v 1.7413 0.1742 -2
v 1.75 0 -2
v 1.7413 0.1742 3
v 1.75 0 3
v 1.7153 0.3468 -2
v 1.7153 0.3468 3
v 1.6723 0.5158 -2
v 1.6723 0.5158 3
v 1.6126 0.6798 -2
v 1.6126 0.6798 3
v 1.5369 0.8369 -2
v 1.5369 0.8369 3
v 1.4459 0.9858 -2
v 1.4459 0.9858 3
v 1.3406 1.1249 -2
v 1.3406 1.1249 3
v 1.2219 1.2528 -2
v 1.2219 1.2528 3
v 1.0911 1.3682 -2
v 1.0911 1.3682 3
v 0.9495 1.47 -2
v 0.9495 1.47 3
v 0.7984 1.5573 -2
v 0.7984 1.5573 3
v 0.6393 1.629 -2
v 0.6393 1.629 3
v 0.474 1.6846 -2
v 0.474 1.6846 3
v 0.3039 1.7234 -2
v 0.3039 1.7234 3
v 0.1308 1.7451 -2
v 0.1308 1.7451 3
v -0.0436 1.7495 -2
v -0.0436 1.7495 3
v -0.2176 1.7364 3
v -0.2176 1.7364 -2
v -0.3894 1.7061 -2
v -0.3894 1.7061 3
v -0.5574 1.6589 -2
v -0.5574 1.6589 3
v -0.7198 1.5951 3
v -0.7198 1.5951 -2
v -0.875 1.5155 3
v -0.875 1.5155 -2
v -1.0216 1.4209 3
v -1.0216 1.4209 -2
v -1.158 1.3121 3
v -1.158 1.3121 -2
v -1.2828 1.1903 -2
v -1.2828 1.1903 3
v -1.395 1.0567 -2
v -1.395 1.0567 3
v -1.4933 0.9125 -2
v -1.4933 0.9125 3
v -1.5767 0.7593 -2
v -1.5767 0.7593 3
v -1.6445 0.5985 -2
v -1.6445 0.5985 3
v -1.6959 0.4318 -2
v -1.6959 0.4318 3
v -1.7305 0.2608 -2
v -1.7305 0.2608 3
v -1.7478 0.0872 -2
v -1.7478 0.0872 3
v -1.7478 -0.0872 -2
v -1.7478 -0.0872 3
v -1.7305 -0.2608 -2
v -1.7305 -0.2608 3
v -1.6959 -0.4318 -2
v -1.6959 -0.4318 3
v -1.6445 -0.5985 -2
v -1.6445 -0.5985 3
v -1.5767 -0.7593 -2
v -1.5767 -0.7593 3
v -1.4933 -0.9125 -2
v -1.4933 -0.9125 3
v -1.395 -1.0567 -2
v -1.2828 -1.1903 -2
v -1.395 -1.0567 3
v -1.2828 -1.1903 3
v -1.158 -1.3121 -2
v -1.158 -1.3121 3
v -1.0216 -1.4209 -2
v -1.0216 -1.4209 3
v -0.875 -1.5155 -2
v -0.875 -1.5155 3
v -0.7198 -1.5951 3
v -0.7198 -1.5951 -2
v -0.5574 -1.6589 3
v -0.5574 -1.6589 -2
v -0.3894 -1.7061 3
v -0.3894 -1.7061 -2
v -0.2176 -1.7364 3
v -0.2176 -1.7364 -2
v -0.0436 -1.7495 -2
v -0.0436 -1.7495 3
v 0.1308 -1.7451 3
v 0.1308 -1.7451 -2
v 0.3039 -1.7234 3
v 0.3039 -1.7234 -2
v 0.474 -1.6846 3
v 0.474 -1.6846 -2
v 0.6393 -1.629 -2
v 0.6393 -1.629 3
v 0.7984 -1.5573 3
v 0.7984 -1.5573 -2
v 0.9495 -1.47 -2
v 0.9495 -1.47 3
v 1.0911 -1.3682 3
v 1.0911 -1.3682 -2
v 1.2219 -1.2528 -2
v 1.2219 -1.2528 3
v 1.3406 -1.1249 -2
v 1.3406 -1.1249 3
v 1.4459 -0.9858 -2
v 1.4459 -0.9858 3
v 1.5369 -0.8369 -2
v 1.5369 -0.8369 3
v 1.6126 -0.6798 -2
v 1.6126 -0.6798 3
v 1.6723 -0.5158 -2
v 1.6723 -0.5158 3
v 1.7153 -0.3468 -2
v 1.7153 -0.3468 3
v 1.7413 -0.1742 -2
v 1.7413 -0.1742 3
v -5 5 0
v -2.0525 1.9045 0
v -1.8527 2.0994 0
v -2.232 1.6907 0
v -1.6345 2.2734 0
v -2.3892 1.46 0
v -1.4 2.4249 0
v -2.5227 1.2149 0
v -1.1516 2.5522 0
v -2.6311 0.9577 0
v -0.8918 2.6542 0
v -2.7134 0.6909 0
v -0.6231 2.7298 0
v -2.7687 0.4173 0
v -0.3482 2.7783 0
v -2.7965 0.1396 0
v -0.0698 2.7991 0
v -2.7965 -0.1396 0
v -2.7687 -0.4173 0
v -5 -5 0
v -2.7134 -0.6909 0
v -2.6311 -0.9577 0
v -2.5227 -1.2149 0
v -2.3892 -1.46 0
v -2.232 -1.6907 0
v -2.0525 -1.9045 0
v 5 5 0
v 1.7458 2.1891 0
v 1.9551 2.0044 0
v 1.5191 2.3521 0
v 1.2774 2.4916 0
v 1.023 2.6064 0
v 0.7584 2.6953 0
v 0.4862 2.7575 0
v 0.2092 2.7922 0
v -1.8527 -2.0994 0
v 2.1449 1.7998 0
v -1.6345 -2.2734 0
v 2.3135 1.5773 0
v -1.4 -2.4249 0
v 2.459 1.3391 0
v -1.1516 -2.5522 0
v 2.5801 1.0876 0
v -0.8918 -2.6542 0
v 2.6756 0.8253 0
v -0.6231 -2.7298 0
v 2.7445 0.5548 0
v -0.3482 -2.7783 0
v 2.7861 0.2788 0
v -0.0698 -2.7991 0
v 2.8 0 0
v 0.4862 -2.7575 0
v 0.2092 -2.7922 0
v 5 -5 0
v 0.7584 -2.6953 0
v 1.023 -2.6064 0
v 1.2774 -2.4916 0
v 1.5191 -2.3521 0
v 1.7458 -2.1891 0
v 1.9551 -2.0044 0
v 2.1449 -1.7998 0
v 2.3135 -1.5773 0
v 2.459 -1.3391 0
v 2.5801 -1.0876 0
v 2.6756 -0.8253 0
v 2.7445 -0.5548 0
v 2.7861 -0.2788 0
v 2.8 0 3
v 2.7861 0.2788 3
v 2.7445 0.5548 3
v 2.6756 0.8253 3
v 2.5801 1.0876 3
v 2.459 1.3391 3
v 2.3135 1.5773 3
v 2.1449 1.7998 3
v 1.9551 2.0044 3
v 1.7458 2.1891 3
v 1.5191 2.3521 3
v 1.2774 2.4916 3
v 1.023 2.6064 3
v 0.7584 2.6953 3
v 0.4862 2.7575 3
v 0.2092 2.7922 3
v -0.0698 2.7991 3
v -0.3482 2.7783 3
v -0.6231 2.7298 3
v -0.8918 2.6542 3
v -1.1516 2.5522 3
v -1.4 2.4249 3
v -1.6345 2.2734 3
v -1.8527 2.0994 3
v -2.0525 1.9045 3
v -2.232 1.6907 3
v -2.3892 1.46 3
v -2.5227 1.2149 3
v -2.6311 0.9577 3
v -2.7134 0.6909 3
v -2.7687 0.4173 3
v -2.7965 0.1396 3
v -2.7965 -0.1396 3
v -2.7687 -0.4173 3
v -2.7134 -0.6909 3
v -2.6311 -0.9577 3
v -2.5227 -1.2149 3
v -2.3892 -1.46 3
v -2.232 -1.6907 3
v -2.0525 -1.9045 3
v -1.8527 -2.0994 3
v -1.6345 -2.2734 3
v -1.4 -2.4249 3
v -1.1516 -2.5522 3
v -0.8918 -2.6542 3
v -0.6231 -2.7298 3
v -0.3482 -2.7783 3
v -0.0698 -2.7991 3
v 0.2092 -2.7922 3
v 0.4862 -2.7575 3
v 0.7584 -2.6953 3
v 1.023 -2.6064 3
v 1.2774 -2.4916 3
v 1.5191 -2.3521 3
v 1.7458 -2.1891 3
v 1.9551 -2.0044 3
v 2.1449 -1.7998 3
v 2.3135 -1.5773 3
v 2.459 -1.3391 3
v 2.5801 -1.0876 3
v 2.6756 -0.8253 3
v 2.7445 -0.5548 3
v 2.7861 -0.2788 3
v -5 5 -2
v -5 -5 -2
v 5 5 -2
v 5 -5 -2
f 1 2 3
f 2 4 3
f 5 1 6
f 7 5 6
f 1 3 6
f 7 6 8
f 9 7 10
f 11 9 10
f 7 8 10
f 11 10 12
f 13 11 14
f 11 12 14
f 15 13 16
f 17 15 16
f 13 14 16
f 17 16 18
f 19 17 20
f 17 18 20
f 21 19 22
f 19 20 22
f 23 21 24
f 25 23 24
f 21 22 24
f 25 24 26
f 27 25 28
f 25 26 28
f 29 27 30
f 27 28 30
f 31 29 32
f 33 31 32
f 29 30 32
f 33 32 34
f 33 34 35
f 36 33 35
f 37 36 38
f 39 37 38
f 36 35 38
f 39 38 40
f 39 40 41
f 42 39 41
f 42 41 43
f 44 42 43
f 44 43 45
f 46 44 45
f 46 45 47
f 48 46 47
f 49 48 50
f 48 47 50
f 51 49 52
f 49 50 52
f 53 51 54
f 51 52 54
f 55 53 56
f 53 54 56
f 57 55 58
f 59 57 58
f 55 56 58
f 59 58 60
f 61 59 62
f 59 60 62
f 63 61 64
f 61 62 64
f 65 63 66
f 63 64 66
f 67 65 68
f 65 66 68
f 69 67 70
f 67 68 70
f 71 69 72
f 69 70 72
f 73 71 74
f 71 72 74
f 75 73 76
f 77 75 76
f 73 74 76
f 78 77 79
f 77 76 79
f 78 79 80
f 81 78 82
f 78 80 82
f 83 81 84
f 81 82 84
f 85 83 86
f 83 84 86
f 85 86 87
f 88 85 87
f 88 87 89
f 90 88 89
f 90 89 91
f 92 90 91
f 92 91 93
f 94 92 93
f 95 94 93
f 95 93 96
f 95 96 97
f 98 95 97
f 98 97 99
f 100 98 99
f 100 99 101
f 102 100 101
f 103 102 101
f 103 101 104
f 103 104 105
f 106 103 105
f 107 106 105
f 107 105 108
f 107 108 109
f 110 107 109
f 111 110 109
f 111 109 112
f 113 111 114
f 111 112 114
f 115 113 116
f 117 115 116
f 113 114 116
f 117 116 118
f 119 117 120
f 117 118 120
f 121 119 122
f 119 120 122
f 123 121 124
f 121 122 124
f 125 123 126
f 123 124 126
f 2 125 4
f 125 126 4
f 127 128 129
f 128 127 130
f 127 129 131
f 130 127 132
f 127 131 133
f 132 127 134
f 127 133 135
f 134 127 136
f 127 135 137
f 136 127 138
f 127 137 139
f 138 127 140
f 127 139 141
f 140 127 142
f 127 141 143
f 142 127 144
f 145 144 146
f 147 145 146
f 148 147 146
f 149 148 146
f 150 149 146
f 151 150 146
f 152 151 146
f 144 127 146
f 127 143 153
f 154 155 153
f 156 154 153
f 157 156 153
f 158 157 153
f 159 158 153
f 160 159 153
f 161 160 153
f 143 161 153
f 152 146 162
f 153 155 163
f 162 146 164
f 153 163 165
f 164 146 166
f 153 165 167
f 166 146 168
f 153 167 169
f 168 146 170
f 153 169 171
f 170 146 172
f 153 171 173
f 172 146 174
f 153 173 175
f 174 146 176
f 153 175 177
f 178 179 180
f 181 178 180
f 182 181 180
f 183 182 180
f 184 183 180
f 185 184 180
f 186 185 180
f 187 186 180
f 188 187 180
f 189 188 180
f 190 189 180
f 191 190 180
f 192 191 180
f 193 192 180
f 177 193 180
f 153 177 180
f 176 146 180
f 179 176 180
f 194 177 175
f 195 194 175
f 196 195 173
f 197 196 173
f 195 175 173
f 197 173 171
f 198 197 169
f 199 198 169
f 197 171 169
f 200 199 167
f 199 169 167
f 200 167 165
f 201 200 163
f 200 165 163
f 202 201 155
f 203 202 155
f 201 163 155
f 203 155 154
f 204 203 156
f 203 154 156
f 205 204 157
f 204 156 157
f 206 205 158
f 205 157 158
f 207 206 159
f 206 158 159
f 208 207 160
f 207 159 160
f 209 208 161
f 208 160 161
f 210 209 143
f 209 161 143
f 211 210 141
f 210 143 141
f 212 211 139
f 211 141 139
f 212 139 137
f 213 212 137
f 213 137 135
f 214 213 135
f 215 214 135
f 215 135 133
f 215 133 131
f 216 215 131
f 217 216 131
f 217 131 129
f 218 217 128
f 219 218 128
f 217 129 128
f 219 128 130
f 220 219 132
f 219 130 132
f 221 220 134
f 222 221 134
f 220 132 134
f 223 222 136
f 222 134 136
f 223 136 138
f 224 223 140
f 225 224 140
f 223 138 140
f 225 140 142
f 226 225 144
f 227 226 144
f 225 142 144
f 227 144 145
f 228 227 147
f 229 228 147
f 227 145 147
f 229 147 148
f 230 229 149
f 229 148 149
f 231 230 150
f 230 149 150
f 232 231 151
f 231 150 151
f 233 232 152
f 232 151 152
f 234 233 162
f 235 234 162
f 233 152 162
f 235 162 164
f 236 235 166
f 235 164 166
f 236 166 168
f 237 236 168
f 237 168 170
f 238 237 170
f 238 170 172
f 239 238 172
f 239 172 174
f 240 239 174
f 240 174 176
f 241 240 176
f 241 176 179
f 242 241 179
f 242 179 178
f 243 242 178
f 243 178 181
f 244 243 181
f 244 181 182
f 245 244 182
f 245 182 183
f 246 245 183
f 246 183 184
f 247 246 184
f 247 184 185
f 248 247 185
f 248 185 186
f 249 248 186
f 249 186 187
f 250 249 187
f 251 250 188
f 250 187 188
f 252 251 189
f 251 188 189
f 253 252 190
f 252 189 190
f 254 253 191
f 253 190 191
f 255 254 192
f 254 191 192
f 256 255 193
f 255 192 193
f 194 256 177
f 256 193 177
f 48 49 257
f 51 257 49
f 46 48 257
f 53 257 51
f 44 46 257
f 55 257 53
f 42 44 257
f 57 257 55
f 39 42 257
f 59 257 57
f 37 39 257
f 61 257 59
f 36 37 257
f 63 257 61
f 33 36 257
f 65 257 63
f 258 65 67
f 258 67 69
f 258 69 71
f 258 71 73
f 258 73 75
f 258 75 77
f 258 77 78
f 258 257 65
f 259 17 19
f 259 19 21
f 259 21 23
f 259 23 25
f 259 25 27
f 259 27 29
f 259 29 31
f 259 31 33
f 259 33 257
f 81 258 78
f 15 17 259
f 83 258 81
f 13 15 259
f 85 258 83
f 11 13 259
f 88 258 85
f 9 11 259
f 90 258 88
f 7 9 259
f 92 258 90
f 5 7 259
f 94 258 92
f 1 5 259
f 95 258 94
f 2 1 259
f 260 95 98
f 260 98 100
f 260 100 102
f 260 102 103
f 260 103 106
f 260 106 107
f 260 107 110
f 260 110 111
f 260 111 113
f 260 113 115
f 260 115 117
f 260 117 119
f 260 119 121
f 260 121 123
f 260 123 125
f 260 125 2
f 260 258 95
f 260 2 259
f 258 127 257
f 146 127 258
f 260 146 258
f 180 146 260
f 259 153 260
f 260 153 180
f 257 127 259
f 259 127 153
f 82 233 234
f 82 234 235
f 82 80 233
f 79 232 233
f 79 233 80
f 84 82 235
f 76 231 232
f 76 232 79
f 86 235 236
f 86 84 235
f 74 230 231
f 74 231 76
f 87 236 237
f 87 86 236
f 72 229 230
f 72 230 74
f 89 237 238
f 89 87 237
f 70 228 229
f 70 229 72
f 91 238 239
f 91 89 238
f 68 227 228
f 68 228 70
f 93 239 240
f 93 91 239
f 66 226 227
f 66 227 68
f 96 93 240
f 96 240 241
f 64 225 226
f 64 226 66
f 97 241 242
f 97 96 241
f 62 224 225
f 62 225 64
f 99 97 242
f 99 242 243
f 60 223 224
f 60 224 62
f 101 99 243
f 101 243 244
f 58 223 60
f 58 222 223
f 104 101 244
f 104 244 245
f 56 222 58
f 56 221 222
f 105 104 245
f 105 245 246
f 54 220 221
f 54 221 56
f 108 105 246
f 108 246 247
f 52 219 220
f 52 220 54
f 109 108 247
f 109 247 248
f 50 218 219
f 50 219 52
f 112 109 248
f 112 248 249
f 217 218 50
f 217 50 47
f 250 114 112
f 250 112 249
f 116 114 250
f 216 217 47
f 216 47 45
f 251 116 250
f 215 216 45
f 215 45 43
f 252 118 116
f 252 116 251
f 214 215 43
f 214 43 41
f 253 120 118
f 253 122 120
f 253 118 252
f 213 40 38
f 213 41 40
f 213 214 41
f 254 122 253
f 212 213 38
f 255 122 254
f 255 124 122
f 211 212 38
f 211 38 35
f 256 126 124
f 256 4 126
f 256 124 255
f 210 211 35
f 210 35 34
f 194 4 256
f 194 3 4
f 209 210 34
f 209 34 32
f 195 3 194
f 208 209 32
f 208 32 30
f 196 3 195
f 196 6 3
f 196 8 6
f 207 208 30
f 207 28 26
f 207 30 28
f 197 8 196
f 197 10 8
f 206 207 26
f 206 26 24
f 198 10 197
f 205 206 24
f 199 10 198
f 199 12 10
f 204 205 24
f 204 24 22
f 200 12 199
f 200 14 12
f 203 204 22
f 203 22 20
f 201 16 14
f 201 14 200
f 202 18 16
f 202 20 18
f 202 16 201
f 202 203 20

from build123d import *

# Parameters (mm, degrees)
SKETCH_R        = 2.8
PAD_DEPTH       = 3
SKETCH001_R     = 1.75
POCKET_DEPTH    = 4
SKETCH002_W     = 10
SKETCH002_H     = 10
PAD001_DEPTH    = 2
SKETCH003_R     = 1.75
POCKET001_DEPTH = 5


with BuildPart() as part:
    # Sketch → Pad (new body)
    with BuildSketch(Plane.XY):
        Circle(SKETCH_R)
    extrude(amount=PAD_DEPTH)

    # Sketch001 (on Face3 of Pad) → Pocket (cut)
    with BuildSketch(Plane.XY.offset(3)):
        Circle(SKETCH001_R)
    extrude(amount=-POCKET_DEPTH, mode=Mode.SUBTRACT)

    # Sketch002 (on Face2 of Pocket) → Pad001 (join)
    with BuildSketch(Plane(origin=(0, 0, 0), x_dir=(1, 0, 0), z_dir=(0, 0, -1))):
        Rectangle(SKETCH002_W, SKETCH002_H)
    extrude(amount=PAD001_DEPTH)

    # Sketch003 (on Face10 of Pad001) → Pocket001 (cut)
    with BuildSketch(Plane.XY):
        Circle(SKETCH003_R)
    extrude(amount=-POCKET001_DEPTH, mode=Mode.SUBTRACT)


solid = part.part
